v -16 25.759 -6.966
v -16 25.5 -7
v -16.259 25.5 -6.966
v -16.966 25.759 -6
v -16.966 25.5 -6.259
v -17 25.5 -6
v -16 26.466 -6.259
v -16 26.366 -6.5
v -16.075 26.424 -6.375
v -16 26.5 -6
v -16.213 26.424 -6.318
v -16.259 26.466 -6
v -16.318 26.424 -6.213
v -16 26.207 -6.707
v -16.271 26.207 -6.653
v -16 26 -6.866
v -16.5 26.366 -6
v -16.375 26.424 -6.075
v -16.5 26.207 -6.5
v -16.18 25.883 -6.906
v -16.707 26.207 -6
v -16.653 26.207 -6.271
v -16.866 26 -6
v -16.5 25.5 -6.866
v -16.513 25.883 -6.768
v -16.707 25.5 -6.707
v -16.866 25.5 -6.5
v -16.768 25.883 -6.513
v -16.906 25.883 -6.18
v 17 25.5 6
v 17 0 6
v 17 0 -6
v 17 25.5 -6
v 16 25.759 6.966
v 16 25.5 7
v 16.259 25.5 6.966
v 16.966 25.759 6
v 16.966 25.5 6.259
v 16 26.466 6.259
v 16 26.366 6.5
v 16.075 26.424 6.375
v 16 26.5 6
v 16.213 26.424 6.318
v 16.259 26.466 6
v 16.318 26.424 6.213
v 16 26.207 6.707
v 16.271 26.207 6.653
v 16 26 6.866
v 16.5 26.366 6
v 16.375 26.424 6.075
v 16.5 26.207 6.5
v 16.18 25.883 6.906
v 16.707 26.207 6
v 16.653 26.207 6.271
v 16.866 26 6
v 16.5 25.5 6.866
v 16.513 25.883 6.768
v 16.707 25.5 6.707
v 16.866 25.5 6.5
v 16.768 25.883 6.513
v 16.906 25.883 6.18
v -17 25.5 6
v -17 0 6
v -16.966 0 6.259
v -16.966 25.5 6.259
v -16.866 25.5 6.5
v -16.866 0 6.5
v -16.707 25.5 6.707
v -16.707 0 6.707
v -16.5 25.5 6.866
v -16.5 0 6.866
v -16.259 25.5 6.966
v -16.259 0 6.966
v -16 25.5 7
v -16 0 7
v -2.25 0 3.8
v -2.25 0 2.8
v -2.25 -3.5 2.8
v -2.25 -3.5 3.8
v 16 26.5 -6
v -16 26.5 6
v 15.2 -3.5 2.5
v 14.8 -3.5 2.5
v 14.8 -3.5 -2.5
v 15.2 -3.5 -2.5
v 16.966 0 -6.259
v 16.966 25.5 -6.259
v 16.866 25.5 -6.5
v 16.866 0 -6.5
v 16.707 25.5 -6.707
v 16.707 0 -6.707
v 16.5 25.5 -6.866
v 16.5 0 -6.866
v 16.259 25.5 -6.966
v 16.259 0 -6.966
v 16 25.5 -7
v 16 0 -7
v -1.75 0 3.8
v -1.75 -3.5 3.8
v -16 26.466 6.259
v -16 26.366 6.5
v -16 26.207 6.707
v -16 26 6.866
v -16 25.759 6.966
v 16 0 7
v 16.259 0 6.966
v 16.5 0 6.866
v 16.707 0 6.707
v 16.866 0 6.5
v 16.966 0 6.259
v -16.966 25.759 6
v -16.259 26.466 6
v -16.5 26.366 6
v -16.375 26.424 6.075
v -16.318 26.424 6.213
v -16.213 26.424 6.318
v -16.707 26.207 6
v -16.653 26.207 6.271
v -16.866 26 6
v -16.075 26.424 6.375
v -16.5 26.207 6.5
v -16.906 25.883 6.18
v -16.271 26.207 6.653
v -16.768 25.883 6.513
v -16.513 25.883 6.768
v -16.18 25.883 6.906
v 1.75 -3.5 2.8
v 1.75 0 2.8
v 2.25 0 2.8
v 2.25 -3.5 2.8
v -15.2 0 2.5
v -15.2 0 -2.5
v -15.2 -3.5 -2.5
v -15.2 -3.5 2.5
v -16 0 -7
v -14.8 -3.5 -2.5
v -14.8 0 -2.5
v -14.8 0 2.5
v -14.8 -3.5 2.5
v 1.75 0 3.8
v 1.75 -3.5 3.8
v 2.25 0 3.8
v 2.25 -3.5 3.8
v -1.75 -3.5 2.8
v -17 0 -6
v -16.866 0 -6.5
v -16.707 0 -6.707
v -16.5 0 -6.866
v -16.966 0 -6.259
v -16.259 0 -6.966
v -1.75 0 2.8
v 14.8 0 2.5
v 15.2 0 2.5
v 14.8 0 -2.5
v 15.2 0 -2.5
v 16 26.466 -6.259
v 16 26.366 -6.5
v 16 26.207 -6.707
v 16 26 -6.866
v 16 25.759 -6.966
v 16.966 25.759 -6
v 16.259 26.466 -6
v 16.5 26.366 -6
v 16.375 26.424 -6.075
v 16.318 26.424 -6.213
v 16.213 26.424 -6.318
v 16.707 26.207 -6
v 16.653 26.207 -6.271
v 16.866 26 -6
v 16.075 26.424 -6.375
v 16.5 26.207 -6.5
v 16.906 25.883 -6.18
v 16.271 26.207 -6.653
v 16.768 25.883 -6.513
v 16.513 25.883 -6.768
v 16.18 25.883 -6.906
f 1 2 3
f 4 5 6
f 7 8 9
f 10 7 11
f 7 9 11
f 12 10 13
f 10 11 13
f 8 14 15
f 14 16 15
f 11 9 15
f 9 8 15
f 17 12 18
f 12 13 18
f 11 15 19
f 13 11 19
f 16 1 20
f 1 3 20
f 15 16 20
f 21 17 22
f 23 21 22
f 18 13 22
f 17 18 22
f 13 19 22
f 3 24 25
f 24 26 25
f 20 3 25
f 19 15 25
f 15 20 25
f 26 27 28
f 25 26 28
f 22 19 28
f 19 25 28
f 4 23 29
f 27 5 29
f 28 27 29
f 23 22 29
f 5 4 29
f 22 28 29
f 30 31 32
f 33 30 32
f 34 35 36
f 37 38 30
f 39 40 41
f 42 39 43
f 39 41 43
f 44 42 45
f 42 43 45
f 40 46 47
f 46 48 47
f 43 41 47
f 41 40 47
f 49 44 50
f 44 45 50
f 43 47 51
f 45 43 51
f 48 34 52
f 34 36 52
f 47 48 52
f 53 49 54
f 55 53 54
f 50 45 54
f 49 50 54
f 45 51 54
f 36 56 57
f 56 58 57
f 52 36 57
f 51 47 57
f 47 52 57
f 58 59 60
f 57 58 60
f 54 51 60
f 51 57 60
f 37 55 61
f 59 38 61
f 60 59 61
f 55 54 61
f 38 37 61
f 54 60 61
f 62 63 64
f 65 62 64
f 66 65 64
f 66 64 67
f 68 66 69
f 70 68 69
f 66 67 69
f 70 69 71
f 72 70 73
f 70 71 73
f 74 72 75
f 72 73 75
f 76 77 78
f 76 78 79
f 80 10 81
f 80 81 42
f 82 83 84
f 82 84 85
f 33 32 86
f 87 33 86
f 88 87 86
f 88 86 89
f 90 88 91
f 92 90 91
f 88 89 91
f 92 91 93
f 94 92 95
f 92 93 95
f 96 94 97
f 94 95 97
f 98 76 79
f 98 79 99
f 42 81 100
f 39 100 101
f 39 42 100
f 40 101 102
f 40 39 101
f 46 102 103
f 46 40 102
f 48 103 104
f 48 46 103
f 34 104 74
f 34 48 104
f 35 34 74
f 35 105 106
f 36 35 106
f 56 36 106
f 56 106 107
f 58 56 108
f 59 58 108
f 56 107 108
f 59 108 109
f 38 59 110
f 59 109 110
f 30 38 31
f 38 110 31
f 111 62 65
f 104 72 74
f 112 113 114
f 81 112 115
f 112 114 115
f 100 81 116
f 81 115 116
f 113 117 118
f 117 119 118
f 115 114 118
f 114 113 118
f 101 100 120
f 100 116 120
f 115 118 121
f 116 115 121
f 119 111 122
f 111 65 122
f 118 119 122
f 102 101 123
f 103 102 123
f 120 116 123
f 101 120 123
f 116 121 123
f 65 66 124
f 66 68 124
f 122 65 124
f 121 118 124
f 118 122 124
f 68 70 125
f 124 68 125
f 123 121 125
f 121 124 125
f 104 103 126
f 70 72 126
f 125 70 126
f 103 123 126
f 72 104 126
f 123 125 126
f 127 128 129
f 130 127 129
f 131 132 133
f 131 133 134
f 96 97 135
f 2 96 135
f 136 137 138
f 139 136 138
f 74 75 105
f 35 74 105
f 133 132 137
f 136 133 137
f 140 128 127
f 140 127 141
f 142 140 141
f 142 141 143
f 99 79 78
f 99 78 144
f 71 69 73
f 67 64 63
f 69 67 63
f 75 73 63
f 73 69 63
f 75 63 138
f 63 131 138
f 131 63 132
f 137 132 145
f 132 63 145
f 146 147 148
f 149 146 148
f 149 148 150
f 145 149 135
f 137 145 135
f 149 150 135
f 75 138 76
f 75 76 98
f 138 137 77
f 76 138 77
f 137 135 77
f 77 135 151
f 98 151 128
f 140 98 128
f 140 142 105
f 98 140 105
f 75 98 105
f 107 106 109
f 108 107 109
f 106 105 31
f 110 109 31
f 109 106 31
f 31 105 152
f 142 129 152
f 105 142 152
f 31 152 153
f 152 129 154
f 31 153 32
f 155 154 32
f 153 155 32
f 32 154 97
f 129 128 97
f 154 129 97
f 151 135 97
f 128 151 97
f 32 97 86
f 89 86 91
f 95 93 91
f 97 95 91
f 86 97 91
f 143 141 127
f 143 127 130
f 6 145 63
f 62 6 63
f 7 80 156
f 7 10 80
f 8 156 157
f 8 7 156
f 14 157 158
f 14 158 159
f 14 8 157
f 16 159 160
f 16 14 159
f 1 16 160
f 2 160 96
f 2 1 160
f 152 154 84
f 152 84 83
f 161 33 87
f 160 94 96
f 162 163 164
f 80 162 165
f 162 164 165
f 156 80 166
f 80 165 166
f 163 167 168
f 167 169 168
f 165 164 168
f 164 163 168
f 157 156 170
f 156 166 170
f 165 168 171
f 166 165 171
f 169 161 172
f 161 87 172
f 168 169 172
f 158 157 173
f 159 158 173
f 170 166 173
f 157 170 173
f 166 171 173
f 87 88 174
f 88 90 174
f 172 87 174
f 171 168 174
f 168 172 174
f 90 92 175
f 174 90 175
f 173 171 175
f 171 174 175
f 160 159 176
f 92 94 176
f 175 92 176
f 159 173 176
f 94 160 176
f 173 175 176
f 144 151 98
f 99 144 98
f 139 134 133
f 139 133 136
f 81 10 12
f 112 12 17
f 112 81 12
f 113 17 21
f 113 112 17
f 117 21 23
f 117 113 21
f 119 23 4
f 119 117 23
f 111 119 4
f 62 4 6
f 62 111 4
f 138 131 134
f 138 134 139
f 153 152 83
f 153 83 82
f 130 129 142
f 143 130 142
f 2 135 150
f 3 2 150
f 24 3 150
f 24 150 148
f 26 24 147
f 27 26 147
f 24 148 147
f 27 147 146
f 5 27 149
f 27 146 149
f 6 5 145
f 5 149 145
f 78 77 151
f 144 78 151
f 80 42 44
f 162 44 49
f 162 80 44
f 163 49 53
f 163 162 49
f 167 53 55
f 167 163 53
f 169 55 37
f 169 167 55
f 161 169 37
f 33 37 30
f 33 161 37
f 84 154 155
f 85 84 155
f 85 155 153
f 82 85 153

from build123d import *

# Parameters (mm, degrees)
BOSS_EXTRUDE1_DEPTH = 26.5
SKETCH2_W           = 0.4
SKETCH2_H           = 5
SKETCH2_W_2         = 0.5
SKETCH2_H_2         = 1
BOSS_EXTRUDE2_DEPTH = 3.5
FILLET1_R           = 1


with BuildPart() as part:
    # Sketch1 → Boss-Extrude1 (new body)
    with BuildSketch(Plane(origin=(0, 0, 0), x_dir=(1, 0, 0), z_dir=(0, 1, 0))):
        with BuildLine():
            Line((-16, -7), (16, -7))
            ThreePointArc((16, -7), (16.707106781, -6.707106781), (17, -6))
            Line((17, -6), (17, 6))
            ThreePointArc((17, 6), (16.707106781, 6.707106781), (16, 7))
            Line((16, 7), (-16, 7))
            ThreePointArc((-16, 7), (-16.707106781, 6.707106781), (-17, 6))
            Line((-17, 6), (-17, -6))
            ThreePointArc((-17, -6), (-16.707106781, -6.707106781), (-16, -7))
        make_face()
    extrude(amount=BOSS_EXTRUDE1_DEPTH)

    # Sketch2 → Boss-Extrude2 (add)
    with BuildSketch(Plane.XZ):
        with Locations((-15, 0)):
            Rectangle(SKETCH2_W, SKETCH2_H)
        with Locations((15, 0)):
            Rectangle(SKETCH2_W, SKETCH2_H)
        with Locations((-2, 3.3)):
            Rectangle(SKETCH2_W_2, SKETCH2_H_2)
        with Locations((2, 3.3)):
            Rectangle(SKETCH2_W_2, SKETCH2_H_2)
    extrude(amount=BOSS_EXTRUDE2_DEPTH)

    # Fillet1
    fillet1_edges = [part.edges().sort_by_distance(p)[0] for p in [
        (-16.707106781, 26.5, -6.707106781),
        (-17, 26.5, 0),
        (-16.707106781, 26.5, 6.707106781),
        (0, 26.5, 7),
        (16.707106781, 26.5, 6.707106781),
        (17, 26.5, 0),
        (16.707106781, 26.5, -6.707106781),
        (0, 26.5, -7),
    ]]
    fillet(fillet1_edges, radius=FILLET1_R)


solid = part.part
